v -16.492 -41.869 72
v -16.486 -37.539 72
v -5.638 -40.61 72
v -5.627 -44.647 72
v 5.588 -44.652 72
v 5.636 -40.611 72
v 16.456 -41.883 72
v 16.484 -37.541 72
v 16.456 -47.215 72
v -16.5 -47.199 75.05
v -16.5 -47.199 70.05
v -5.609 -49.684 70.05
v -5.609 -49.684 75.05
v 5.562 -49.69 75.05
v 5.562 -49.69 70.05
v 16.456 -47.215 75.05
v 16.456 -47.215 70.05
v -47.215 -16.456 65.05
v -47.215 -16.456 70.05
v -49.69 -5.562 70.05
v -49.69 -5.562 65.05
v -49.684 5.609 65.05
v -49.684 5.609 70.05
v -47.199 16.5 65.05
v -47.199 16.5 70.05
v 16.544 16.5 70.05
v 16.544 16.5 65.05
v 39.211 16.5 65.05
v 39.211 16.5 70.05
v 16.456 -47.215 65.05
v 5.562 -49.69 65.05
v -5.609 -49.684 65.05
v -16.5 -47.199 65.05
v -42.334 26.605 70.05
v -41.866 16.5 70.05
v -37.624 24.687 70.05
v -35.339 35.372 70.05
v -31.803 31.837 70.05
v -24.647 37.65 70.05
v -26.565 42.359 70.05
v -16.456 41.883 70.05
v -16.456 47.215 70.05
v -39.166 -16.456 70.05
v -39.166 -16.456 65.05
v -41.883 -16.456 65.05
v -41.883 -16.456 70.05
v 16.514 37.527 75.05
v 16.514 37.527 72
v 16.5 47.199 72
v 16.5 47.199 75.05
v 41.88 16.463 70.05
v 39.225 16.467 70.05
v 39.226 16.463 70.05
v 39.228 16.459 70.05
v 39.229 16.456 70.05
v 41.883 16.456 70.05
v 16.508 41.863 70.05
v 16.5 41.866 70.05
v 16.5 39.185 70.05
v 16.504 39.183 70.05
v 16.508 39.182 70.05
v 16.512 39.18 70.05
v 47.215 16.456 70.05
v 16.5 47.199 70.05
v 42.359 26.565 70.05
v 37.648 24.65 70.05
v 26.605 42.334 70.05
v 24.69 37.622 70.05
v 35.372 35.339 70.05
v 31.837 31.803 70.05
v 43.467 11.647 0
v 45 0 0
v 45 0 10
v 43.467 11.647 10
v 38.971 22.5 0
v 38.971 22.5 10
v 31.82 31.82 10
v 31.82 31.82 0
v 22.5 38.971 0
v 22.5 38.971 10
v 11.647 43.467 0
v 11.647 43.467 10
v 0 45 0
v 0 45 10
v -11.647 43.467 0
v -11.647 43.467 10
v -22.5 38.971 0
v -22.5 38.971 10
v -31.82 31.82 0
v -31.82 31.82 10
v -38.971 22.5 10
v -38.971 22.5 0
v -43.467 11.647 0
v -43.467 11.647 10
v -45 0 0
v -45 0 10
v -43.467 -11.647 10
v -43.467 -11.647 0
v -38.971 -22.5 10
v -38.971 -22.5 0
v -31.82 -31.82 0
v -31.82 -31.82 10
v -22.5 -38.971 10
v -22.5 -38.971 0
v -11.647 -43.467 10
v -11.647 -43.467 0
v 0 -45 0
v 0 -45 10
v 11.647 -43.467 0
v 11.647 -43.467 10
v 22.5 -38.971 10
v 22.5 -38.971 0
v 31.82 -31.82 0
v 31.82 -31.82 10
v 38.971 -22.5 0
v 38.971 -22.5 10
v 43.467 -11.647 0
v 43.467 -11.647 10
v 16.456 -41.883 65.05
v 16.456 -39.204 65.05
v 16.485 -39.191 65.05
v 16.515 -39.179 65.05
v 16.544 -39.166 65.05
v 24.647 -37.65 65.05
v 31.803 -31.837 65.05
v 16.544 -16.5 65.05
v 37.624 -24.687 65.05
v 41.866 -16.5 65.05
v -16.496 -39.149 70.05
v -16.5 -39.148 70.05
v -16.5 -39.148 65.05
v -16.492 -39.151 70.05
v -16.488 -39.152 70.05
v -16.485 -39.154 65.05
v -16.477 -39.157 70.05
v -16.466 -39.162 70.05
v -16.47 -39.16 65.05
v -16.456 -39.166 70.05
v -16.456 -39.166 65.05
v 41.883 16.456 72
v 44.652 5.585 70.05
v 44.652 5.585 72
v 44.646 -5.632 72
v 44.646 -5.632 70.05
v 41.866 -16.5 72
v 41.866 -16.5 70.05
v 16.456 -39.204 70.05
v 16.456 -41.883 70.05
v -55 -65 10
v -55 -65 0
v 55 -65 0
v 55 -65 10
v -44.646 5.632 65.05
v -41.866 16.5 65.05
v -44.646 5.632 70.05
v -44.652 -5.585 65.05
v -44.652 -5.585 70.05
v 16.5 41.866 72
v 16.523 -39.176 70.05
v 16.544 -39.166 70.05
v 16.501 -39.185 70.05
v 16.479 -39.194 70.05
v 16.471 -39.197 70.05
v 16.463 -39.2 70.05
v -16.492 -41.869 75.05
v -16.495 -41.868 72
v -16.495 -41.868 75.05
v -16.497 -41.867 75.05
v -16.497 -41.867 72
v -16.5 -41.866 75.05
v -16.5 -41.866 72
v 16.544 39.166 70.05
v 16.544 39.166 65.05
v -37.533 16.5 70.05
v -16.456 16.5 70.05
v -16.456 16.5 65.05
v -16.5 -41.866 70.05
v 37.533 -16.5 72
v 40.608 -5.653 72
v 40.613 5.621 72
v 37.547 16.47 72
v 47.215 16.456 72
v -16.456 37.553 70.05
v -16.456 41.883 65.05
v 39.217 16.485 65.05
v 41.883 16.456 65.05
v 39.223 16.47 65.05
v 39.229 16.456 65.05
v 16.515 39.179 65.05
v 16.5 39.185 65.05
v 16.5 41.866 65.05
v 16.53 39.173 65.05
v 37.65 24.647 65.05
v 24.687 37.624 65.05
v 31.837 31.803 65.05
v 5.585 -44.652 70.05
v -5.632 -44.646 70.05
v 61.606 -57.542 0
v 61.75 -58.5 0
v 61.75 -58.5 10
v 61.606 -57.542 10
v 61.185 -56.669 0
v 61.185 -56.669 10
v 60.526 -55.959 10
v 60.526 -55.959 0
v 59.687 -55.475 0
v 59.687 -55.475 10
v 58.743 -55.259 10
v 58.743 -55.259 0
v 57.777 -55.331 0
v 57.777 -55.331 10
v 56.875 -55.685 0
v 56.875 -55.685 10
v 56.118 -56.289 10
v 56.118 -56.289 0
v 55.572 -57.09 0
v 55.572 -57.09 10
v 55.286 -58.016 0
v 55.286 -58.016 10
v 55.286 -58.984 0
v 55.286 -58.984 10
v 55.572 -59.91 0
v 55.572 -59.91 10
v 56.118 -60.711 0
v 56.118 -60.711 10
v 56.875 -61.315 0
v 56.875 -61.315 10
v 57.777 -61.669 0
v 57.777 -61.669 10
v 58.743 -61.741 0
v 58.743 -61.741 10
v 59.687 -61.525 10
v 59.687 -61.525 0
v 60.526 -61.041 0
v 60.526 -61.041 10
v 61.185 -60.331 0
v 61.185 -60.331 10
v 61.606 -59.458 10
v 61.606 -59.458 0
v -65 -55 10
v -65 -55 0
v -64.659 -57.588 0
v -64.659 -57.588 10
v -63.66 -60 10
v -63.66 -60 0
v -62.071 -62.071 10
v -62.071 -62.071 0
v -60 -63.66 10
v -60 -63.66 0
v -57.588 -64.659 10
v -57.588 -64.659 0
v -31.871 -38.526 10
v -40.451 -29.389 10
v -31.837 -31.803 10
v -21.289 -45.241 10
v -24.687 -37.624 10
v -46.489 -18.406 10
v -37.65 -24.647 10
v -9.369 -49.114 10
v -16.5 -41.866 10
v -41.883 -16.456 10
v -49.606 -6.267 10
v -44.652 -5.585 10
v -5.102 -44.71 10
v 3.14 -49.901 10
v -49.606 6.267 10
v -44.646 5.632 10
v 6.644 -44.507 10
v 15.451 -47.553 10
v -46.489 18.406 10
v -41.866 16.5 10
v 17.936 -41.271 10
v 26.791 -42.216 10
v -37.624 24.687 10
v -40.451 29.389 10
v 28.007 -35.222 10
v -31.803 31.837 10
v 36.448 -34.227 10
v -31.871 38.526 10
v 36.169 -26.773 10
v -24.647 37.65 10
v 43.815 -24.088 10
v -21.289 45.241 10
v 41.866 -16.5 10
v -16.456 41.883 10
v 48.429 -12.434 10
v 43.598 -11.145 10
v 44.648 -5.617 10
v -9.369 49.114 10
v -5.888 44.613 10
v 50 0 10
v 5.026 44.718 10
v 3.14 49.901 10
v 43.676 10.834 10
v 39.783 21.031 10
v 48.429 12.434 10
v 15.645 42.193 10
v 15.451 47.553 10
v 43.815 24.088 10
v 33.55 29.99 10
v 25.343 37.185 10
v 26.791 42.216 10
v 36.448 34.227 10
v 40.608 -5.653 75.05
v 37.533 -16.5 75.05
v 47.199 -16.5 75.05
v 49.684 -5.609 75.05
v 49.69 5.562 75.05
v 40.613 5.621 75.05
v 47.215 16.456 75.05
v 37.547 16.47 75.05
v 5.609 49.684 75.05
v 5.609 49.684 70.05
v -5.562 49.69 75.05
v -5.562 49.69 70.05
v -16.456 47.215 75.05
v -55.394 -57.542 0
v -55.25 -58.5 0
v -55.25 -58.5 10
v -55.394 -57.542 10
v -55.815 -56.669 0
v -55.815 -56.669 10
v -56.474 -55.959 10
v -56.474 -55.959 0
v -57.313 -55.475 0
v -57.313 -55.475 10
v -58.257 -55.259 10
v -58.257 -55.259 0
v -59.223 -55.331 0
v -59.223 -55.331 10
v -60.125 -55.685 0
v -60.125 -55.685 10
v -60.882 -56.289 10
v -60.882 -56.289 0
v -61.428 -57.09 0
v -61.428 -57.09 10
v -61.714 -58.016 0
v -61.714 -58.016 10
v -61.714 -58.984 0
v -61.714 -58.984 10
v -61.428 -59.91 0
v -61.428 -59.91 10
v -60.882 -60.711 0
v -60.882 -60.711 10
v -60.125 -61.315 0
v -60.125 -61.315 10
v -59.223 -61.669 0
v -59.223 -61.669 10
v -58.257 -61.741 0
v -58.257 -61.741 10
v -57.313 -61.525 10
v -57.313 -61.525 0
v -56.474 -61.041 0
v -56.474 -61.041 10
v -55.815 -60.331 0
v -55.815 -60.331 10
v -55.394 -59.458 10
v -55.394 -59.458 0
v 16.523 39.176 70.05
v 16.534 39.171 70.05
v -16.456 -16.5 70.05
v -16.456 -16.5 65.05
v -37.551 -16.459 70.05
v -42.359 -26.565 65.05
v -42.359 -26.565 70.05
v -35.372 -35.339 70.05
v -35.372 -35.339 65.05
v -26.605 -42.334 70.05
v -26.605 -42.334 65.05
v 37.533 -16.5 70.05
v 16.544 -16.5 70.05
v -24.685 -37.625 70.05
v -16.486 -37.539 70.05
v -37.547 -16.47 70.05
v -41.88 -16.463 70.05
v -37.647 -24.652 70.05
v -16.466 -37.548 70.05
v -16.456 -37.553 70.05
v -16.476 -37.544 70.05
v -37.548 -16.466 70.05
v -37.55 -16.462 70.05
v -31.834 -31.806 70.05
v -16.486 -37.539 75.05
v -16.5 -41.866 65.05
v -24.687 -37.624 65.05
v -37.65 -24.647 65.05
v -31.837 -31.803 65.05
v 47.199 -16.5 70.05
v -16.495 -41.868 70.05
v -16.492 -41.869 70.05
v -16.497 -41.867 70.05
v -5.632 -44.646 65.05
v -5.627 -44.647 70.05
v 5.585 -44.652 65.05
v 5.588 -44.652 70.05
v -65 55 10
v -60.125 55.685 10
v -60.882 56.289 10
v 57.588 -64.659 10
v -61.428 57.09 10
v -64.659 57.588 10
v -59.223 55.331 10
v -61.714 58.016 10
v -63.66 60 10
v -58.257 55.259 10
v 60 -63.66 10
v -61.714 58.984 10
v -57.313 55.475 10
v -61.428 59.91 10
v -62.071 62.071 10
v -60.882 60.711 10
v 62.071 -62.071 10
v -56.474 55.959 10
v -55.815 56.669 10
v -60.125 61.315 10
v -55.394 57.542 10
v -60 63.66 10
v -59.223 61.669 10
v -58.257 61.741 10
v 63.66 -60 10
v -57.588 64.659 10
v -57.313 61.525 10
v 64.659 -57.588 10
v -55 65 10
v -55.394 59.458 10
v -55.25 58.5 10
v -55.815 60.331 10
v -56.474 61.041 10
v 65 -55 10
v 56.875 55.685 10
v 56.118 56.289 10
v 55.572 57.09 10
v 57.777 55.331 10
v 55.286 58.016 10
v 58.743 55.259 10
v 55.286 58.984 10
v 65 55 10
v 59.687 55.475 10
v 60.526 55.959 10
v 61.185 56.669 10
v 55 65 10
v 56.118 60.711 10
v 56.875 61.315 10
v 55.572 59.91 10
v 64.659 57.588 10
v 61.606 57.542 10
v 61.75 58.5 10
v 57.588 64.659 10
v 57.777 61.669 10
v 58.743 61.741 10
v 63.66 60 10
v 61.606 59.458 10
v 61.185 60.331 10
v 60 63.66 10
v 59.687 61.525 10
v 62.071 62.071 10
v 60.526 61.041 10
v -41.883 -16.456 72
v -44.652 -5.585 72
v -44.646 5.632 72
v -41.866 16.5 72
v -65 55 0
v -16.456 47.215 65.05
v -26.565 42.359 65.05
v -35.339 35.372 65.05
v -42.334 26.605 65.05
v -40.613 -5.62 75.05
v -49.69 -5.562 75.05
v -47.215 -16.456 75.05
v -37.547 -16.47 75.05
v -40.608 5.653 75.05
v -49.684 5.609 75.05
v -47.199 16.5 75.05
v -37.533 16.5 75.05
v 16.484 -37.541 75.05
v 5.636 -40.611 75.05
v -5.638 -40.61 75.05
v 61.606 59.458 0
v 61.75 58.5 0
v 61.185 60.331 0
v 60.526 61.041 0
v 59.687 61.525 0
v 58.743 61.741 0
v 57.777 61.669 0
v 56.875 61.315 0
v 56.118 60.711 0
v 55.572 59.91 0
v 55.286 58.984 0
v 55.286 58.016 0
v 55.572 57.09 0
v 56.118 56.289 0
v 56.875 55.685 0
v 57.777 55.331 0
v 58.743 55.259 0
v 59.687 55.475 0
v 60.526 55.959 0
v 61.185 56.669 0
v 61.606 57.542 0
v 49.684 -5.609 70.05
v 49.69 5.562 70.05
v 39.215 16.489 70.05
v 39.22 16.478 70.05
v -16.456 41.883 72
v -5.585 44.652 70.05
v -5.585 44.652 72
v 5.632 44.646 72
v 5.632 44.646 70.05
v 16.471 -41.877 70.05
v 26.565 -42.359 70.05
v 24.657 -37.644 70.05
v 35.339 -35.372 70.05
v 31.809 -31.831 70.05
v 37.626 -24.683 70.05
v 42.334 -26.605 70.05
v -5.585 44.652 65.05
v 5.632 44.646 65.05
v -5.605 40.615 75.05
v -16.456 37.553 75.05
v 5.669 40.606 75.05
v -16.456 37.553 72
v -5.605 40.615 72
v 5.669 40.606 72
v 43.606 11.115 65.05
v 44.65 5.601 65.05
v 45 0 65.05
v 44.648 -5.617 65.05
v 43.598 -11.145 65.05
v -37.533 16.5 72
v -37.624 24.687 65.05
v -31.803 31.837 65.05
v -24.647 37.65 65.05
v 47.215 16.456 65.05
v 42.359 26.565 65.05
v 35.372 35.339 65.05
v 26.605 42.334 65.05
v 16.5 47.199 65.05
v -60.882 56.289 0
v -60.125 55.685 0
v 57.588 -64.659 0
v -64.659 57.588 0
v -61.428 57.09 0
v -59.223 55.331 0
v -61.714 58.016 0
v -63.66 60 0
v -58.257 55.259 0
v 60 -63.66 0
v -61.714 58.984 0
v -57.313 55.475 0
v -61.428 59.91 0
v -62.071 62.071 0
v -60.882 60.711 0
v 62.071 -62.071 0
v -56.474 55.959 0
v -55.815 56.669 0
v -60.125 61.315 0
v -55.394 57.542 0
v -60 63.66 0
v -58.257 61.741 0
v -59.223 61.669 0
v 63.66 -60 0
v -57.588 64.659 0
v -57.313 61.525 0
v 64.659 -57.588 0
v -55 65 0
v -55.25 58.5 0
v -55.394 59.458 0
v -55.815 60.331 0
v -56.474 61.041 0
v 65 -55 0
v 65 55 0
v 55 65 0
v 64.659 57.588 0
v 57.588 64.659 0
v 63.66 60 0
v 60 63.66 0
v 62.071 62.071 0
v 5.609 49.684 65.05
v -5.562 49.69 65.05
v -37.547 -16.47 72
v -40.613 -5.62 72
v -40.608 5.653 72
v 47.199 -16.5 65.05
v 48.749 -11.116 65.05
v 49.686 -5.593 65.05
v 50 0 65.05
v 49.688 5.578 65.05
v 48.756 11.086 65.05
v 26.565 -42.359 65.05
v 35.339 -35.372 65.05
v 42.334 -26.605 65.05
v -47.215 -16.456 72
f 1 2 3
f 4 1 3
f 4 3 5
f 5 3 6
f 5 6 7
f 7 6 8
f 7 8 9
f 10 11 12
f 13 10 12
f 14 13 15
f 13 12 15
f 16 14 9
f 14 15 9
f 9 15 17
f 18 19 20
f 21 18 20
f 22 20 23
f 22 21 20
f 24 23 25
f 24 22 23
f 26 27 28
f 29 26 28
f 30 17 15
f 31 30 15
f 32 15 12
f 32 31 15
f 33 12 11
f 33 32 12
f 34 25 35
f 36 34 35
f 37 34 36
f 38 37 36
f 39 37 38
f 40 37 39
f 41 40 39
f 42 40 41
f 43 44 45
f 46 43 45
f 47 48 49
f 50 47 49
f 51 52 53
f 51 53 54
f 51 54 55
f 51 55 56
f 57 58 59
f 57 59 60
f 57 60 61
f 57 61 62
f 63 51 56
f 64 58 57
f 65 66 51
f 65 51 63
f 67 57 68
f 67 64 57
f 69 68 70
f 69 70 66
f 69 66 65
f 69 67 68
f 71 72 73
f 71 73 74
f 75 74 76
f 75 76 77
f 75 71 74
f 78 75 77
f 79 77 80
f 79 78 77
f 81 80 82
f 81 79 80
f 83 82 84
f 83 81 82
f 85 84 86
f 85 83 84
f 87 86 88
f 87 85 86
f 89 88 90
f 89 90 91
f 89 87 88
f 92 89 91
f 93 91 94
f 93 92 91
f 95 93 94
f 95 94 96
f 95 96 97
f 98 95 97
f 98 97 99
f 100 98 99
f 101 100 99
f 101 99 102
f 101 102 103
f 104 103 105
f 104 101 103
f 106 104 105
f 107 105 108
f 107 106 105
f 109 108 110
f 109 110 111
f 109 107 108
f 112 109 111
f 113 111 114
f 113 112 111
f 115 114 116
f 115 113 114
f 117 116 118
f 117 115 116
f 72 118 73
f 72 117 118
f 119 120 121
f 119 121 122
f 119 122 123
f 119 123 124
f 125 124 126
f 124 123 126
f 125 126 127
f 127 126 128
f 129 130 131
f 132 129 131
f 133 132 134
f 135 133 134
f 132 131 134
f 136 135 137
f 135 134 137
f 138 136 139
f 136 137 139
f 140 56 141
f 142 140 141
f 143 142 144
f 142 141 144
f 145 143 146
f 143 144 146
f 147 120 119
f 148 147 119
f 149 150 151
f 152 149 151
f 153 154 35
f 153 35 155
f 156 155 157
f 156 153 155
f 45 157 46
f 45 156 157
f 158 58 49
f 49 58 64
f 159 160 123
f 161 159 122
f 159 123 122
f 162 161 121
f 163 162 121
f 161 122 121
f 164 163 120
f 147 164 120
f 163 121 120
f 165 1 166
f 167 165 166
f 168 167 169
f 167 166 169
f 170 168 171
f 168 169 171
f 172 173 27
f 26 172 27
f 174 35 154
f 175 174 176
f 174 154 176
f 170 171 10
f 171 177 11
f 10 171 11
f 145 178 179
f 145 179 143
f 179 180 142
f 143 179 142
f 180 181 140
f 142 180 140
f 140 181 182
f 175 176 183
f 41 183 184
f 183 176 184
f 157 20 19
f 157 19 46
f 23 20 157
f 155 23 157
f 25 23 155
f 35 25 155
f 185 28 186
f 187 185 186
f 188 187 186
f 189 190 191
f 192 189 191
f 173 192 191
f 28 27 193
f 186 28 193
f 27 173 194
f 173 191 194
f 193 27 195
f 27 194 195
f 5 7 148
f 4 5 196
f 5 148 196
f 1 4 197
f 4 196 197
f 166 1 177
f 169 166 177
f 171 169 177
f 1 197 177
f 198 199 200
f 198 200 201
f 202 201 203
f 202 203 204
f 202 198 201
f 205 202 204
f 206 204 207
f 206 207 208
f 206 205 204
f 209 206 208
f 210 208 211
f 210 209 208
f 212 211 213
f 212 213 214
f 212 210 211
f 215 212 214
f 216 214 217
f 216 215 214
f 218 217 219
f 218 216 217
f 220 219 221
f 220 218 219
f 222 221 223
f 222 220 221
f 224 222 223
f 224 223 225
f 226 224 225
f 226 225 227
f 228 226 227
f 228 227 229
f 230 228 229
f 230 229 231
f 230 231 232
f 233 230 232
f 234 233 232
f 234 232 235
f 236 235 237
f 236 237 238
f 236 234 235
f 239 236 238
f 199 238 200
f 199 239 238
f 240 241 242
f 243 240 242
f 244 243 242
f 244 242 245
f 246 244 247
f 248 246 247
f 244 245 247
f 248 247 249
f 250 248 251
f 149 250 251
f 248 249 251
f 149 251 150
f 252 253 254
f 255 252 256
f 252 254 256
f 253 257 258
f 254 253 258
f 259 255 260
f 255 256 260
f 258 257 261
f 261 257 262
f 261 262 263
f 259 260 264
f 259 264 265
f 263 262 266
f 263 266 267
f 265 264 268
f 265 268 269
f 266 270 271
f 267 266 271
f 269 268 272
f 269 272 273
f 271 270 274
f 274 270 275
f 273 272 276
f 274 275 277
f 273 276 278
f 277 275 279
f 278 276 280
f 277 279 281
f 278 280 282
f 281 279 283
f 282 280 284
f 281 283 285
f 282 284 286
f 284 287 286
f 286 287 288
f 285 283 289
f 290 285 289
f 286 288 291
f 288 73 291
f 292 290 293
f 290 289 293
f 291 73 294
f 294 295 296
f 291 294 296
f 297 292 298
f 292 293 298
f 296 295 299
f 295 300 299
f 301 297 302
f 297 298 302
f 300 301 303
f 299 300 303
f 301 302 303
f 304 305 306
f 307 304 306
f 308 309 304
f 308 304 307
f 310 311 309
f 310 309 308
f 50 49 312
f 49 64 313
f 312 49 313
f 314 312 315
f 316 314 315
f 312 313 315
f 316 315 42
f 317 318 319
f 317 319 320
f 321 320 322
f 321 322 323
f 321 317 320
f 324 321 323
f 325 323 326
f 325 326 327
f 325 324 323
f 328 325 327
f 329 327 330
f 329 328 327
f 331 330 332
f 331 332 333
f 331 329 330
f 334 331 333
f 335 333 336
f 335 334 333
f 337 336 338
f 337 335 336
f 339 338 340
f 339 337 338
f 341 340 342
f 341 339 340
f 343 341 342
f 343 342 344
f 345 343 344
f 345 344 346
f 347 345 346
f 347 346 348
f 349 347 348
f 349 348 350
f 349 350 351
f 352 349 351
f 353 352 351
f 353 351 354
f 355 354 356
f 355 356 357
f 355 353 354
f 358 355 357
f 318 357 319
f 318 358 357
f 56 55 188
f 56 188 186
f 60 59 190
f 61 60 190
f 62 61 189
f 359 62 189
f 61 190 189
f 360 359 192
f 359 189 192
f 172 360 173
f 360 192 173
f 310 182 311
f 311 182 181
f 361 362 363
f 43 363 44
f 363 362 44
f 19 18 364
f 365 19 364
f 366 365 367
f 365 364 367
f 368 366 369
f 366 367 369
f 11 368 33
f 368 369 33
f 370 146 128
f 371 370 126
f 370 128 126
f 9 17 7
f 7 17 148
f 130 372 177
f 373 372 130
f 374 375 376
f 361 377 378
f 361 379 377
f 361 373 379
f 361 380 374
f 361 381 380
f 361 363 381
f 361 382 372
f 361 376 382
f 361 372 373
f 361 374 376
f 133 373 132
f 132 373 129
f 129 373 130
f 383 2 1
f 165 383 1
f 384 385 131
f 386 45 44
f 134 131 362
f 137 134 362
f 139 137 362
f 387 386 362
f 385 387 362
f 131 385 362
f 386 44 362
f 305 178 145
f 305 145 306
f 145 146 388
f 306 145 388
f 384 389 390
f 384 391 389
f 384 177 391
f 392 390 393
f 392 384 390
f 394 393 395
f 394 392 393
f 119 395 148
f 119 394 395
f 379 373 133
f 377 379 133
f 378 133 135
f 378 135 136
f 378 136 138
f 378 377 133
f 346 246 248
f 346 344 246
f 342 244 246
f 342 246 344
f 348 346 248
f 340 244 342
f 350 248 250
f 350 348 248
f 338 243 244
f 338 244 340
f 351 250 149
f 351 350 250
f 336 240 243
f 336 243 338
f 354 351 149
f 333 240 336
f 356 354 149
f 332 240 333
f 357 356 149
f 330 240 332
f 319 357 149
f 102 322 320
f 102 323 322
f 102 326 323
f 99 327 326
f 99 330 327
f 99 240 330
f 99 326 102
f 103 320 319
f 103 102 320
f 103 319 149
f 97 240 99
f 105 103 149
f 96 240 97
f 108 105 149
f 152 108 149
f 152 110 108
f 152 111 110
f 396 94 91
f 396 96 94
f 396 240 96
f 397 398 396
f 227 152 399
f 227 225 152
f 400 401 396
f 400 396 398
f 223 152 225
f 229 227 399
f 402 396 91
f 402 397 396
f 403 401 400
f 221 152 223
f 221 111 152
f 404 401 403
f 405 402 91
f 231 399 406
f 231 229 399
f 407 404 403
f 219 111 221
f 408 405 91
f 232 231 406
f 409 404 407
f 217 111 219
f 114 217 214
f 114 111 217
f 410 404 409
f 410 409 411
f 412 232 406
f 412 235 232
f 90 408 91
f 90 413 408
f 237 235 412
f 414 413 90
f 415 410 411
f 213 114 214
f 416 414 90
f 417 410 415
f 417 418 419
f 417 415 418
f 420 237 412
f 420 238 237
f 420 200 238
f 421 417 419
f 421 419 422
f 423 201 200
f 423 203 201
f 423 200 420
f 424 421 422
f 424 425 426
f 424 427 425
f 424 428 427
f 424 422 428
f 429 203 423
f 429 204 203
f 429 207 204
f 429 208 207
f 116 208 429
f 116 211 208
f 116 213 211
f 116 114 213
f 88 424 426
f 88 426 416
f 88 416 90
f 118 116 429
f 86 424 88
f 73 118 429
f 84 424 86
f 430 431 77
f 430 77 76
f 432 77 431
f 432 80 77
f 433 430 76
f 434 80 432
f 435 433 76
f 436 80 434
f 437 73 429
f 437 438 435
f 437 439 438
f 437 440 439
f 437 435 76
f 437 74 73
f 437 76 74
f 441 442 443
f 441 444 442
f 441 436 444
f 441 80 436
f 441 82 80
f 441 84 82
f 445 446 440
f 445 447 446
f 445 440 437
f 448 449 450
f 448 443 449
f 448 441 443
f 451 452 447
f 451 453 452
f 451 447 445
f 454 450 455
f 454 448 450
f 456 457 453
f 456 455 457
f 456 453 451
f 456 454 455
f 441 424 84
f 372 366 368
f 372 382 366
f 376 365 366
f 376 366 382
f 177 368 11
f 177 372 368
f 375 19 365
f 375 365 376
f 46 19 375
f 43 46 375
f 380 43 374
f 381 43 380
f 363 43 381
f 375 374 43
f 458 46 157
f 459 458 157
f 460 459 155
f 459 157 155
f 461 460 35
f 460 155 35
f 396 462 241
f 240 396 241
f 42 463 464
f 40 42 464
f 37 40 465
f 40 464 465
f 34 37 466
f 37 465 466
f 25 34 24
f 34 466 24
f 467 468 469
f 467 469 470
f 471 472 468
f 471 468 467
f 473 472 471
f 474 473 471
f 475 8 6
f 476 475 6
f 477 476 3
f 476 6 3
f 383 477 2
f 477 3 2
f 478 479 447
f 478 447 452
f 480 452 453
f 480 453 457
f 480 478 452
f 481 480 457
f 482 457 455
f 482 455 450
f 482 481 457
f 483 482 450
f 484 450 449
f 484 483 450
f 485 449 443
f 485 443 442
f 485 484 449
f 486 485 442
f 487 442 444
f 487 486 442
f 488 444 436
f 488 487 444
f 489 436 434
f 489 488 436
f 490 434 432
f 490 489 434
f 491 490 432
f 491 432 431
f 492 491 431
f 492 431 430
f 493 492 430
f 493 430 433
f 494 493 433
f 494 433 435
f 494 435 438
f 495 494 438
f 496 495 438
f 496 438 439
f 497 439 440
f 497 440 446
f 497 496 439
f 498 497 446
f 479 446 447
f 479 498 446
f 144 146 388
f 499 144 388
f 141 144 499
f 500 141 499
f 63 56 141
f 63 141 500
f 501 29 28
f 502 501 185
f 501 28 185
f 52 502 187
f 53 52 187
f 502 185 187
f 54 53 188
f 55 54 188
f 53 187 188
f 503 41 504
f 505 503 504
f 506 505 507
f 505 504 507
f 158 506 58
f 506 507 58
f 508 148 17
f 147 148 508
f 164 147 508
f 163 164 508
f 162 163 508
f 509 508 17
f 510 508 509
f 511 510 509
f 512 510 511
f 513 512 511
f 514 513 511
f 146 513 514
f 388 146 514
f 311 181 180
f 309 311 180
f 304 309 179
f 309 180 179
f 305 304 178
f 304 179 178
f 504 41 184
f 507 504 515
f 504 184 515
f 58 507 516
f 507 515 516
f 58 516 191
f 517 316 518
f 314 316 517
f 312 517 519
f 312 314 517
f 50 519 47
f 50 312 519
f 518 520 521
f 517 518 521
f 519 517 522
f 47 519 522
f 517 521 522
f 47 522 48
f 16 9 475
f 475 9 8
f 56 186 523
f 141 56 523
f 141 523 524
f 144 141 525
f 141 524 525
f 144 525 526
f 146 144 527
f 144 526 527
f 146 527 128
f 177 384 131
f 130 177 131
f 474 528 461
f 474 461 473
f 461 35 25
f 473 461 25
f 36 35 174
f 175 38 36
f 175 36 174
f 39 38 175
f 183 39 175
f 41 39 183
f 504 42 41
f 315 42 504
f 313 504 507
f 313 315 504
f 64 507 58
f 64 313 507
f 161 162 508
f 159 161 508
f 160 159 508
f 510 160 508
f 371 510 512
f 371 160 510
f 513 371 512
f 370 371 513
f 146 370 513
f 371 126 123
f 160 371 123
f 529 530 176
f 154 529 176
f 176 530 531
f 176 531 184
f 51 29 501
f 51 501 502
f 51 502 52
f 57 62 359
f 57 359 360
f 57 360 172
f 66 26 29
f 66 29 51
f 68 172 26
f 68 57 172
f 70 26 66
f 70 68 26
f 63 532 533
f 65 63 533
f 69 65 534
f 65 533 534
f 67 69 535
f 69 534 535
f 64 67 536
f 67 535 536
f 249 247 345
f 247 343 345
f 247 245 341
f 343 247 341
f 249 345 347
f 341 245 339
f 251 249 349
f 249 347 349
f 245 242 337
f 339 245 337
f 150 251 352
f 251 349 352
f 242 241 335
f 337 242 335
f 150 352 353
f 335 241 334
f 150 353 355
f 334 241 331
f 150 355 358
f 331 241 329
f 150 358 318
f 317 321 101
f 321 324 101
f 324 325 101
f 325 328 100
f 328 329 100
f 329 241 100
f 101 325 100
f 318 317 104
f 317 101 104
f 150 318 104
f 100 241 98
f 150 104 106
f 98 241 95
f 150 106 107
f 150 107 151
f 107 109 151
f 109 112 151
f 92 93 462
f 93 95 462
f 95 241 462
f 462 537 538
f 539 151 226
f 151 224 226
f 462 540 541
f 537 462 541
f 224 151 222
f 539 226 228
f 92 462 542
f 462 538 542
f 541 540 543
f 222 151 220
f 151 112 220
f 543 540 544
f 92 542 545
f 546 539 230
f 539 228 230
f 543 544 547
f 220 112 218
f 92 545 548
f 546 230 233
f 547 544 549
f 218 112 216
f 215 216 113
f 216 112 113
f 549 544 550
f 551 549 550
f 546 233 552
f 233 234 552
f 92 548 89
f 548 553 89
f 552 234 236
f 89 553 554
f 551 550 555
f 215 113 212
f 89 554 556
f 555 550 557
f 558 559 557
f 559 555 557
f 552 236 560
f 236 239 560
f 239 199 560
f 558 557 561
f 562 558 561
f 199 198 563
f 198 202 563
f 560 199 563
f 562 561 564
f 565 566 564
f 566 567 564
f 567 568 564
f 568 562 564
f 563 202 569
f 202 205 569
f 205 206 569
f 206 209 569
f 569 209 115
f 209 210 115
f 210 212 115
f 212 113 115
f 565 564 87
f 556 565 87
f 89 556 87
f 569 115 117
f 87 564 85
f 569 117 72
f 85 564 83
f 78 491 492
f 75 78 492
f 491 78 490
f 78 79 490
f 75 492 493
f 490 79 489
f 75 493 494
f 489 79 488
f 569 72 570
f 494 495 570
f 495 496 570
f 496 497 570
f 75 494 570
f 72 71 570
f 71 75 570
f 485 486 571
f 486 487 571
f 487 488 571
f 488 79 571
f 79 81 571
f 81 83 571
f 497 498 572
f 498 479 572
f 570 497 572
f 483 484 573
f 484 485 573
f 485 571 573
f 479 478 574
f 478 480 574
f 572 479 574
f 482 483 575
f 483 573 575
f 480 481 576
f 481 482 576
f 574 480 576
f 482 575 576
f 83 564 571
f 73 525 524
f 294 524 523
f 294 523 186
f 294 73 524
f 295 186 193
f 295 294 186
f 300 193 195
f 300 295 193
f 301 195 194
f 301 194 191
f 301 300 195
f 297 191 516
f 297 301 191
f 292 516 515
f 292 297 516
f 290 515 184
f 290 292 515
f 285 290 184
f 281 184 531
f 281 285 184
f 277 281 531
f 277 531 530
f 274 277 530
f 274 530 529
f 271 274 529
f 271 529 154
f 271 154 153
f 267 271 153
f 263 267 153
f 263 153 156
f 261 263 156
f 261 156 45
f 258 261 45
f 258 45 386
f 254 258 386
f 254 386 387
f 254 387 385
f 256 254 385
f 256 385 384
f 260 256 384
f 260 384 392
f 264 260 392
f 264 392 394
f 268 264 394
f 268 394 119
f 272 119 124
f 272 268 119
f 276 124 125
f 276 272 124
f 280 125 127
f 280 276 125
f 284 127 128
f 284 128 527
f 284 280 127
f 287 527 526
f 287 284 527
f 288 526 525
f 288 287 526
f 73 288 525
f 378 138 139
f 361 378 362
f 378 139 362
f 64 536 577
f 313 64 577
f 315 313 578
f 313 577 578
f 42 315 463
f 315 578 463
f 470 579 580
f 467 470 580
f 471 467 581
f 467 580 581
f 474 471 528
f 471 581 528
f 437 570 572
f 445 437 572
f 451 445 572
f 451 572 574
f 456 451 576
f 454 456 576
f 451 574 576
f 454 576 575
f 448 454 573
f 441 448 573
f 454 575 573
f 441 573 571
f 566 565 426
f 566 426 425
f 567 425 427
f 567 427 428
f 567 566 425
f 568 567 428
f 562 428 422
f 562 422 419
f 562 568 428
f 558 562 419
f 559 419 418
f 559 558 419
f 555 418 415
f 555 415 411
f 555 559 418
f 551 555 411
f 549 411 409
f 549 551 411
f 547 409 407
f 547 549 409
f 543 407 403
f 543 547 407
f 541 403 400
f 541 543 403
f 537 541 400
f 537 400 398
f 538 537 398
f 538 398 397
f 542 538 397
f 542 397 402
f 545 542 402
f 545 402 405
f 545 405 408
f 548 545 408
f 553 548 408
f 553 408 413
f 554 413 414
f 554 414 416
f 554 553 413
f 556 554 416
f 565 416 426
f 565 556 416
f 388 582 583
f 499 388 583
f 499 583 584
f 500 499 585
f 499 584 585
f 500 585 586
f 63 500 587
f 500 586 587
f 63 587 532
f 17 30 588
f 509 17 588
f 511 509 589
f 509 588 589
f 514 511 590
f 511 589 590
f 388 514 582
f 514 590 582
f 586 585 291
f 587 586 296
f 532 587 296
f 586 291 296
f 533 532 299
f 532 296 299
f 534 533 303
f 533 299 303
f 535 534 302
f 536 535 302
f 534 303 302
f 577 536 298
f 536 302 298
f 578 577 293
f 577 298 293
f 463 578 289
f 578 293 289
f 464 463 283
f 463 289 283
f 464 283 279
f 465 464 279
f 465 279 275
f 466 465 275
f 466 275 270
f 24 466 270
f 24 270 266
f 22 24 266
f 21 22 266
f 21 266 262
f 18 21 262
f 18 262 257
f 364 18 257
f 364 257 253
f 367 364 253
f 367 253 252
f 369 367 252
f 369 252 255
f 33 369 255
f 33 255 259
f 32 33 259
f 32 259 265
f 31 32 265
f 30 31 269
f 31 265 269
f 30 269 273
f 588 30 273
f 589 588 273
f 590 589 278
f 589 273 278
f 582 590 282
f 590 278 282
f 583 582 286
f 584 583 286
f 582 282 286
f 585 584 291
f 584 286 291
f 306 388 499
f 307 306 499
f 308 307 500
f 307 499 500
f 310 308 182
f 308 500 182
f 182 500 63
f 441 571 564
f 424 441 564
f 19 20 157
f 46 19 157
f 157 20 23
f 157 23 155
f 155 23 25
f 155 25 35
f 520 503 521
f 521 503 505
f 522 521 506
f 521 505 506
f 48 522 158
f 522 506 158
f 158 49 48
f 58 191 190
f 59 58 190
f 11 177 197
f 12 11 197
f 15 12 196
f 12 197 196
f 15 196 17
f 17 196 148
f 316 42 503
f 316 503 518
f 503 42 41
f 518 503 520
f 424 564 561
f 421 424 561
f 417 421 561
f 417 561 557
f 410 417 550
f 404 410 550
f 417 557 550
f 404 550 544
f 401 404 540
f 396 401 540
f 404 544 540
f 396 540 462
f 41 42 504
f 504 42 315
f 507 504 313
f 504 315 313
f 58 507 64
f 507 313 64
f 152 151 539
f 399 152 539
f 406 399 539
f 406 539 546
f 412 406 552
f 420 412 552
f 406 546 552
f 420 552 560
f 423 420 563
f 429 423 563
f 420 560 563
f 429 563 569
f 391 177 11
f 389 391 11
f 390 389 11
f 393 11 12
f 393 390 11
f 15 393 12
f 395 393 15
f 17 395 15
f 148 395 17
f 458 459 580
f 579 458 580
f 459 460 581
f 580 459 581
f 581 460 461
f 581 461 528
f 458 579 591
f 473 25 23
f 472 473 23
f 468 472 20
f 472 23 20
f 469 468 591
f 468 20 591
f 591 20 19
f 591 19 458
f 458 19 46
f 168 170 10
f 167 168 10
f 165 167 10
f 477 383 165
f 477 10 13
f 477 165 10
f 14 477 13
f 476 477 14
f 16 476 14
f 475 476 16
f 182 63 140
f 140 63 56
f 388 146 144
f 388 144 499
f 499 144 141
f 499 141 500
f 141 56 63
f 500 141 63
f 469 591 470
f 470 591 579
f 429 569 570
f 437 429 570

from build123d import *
from build123d.topology import SkipClean

# Parameters (mm, degrees)
DODANIE_WYCI_GNI_CIE2_DEPTH = 10
SZKIC2_R                    = 50
SZKIC2_R_2                  = 45
DODANIE_WYCI_GNI_CIE3_DEPTH = 55.05
SZKIC4_R                    = 3.25
WYTNIJ_WYCI_GNI_CIE2_DEPTH  = 55
DODANIE_WYCI_GNI_CIE4_DEPTH = 5
SZKIC8_R                    = 45
WYTNIJ_WYCI_GNI_CIE3_DEPTH  = 110.799829235
DODANIE_WYCI_GNI_CIE5_DEPTH = 10
DODANIE_WYCI_GNI_CIE6_START = -3.05
DODANIE_WYCI_GNI_CIE6_DEPTH = 3.05
PODZIEL1_OUTLINE_R          = 3.25
PODZIEL1_OUTLINE_R_2        = 45
PODZIEL1_DEPTH              = 10
PODZIEL1_2_OUTLINE_R        = 3.25
PODZIEL1_2_DEPTH            = 10
PODZIEL1_START              = 70.05
PODZIEL1_3_OUTLINE_R        = 3.25
PODZIEL1_3_DEPTH            = 5
PODZIEL1_START_2            = 72
PODZIEL1_4_DEPTH            = 3.05
PODZIEL1_5_DEPTH            = 1.95
PODZIEL1_6_DEPTH            = 3.05
PODZIEL1_7_DEPTH            = 1.95
PODZIEL1_8_DEPTH            = 3.05
PODZIEL1_9_DEPTH            = 1.95
PODZIEL1_10_DEPTH           = 3.05
PODZIEL1_11_DEPTH           = 1.95


# Read off the part's stored shape, not the designer's step: Podziel1
with BuildPart() as part:
    # Szkic1 → Dodanie-wyciągnięcie2 (new body)
    with BuildSketch(Plane.XY):
        with BuildLine():
            Line((-55, 65), (55, 65))
            ThreePointArc((55, 65), (62.071067812, 62.071067812), (65, 55))
            Line((65, 55), (65, -55))
            ThreePointArc((65, -55), (62.071067812, -62.071067812), (55, -65))
            Line((55, -65), (-55, -65))
            ThreePointArc((-55, -65), (-62.071067812, -62.071067812), (-65, -55))
            Line((-65, -55), (-65, 55))
            ThreePointArc((-65, 55), (-62.071067812, 62.071067812), (-55, 65))
        make_face()
    extrude(amount=DODANIE_WYCI_GNI_CIE2_DEPTH)

    # Szkic2 → Dodanie-wyciągnięcie3 (add)
    with BuildSketch(Plane.XY.offset(10)):
        Circle(SZKIC2_R)
        Circle(SZKIC2_R_2, mode=Mode.SUBTRACT)
    extrude(amount=DODANIE_WYCI_GNI_CIE3_DEPTH)

    # Szkic4 → Wytnij-wyciągnięcie2 (cut)
    with BuildSketch(Plane.XY.offset(10)):
        with Locations((-58.5, 58.5)):
            Circle(SZKIC4_R)
        with Locations((58.5, 58.5)):
            Circle(SZKIC4_R)
        with Locations((58.5, -58.5)):
            Circle(SZKIC4_R)
        with Locations((-58.5, -58.5)):
            Circle(SZKIC4_R)
    extrude(amount=-WYTNIJ_WYCI_GNI_CIE2_DEPTH, mode=Mode.SUBTRACT)

    # Szkic7 → Dodanie-wyciągnięcie4 (add)
    with BuildSketch(Plane.XY.offset(65.05)):
        with BuildLine():
            Line((-16.455530898, 16.5), (-16.455530898, 47.214568757))
            ThreePointArc((-16.455530898, 47.214568757), (-35.338682666, 35.371987609), (-47.199046601, 16.5))
            Line((-47.199046601, 16.5), (-16.455530898, 16.5))
        make_face()
        with BuildLine():
            ThreePointArc((16.5, 39.185016306), (16.522237205, 39.17567049), (16.544469102, 39.166312055))
            Line((16.544469102, 39.166312055), (16.544469102, 16.5))
            Line((16.544469102, 16.5), (39.210781157, 16.5))
            ThreePointArc((39.210781157, 16.5), (39.220139592, 16.477768103), (39.229485408, 16.455530898))
            Line((39.229485408, 16.455530898), (47.214568757, 16.455530898))
            ThreePointArc((47.214568757, 16.455530898), (35.371987609, 35.338682666), (16.5, 47.199046601))
            Line((16.5, 47.199046601), (16.5, 39.185016306))
        make_face()
        with BuildLine():
            ThreePointArc((-16.5, -39.147548354), (-16.477768113, -39.156936517), (-16.455530898, -39.166312055))
            Line((-16.455530898, -39.166312055), (-16.455530898, -16.5))
            Line((-16.455530898, -16.5), (-39.166312055, -16.455530898))
            Line((-39.166312055, -16.455530898), (-47.214568757, -16.455530898))
            ThreePointArc((-47.214568757, -16.455530898), (-35.371987609, -35.338682666), (-16.5, -47.199046601))
            Line((-16.5, -47.199046601), (-16.5, -39.147548354))
        make_face()
        with BuildLine():
            Line((16.544469102, -16.5), (16.544469102, -39.166312055))
            ThreePointArc((16.544469102, -39.166312055), (16.500010596, -39.185011856), (16.455530898, -39.20366119))
            Line((16.455530898, -39.20366119), (16.455530898, -47.214568757))
            ThreePointArc((16.455530898, -47.214568757), (35.338682666, -35.371987609), (47.199046601, -16.5))
            Line((47.199046601, -16.5), (16.544469102, -16.5))
        make_face()
    extrude(amount=DODANIE_WYCI_GNI_CIE4_DEPTH)

    # Szkic8 → Wytnij-wyciągnięcie3 (cut, through all)
    with SkipClean():  # the faces are left unmerged after this step: merging them gives an invalid solid
        with BuildSketch(Plane.XY.offset(10)):
            with Locations(Location((0, 0, 0), (0, 0, 201.449342522))):
                Circle(SZKIC8_R)
        extrude(amount=-WYTNIJ_WYCI_GNI_CIE3_DEPTH, mode=Mode.SUBTRACT)
    add(part.part.scale(1), mode=Mode.REPLACE)  # the faces are merged on a copy

    # Szkic9 → Dodanie-wyciągnięcie5 (add)
    with SkipClean():  # the faces are left unmerged after this step: merging them gives an invalid solid
        with BuildSketch(Plane.XY.offset(65.05)):
            with BuildLine():
                Line((-41.883355917, -16.455530898), (-47.214568757, -16.455530898))
                ThreePointArc((-47.214568757, -16.455530898), (-49.999994454, 0.023550151), (-47.199046601, 16.5))
                Line((-47.199046601, 16.5), (-41.865857211, 16.5))
                ThreePointArc((-41.865857211, 16.5), (-44.999993656, 0.023894067), (-41.883355917, -16.455530898))
            make_face()
            with BuildLine():
                Line((16.455530898, -41.883355917), (16.455530898, -47.214568757))
                ThreePointArc((16.455530898, -47.214568757), (-0.023550151, -49.999994454), (-16.5, -47.199046601))
                Line((-16.5, -47.199046601), (-16.5, -41.865857211))
                ThreePointArc((-16.5, -41.865857211), (-0.023894067, -44.999993656), (16.455530898, -41.883355917))
            make_face()
            with BuildLine():
                Line((41.865857211, -16.5), (47.199046601, -16.5))
                ThreePointArc((47.199046601, -16.5), (49.999994454, -0.023550151), (47.214568757, 16.455530898))
                Line((47.214568757, 16.455530898), (41.883355917, 16.455530898))
                ThreePointArc((41.883355917, 16.455530898), (44.999993656, -0.023894067), (41.865857211, -16.5))
            make_face()
            with BuildLine():
                Line((16.5, 41.865857211), (16.5, 47.199046601))
                ThreePointArc((16.5, 47.199046601), (0.023550151, 49.999994454), (-16.455530898, 47.214568757))
                Line((-16.455530898, 47.214568757), (-16.455530898, 41.883355917))
                ThreePointArc((-16.455530898, 41.883355917), (0.023894067, 44.999993656), (16.5, 41.865857211))
            make_face()
        extrude(amount=DODANIE_WYCI_GNI_CIE5_DEPTH)

    # Szkic10 → Dodanie-wyciągnięcie6 (add)
    with SkipClean():  # the faces are left unmerged after this step: merging them gives an invalid solid
        with BuildSketch(Plane.XY.offset(75.05).offset(DODANIE_WYCI_GNI_CIE6_START)):
            with BuildLine():
                Line((-37.546708344, -16.469507963), (-47.214568757, -16.455530898))
                ThreePointArc((-47.214568757, -16.455530898), (-49.999994454, 0.023550151), (-47.199046601, 16.5))
                Line((-47.199046601, 16.5), (-37.533318532, 16.5))
                ThreePointArc((-37.533318532, 16.5), (-40.999996619, 0.016651212), (-37.546708344, -16.469507963))
            make_face()
            with BuildLine():
                Line((-16.5, -47.199046601), (-16.486007616, -37.539466604))
                ThreePointArc((-16.486007616, -37.539466604), (-0.001345704, -40.999999978), (16.483543336, -37.540548732))
                Line((16.483543336, -37.540548732), (16.455530898, -47.214568757))
                ThreePointArc((16.455530898, -47.214568757), (-0.023550151, -49.999994454), (-16.5, -47.199046601))
            make_face()
            with BuildLine():
                Line((47.199046601, -16.5), (37.533318532, -16.5))
                ThreePointArc((37.533318532, -16.5), (40.999996628, -0.016629068), (37.546690554, 16.46954852))
                Line((37.546690554, 16.46954852), (47.214568757, 16.455530898))
                ThreePointArc((47.214568757, 16.455530898), (49.999994454, -0.023550151), (47.199046601, -16.5))
            make_face()
            with BuildLine():
                Line((-16.455530898, 47.214568757), (-16.455530898, 37.552836149))
                ThreePointArc((-16.455530898, 37.552836149), (0.031934624, 40.999987563), (16.514010216, 37.527156388))
                Line((16.514010216, 37.527156388), (16.5, 47.199046601))
                ThreePointArc((16.5, 47.199046601), (0.023550151, 49.999994454), (-16.455530898, 47.214568757))
            make_face()
        extrude(amount=DODANIE_WYCI_GNI_CIE6_DEPTH)

    # Podziel1 2 outline → Podziel1 2 (cut)
    with SkipClean():  # the faces are left unmerged after this step: merging them gives an invalid solid
        with BuildSketch(Plane.XY):
            with BuildLine():
                ThreePointArc((-65, -55), (-62.071067812, -62.071067812), (-55, -65))
                Line((-55, -65), (55, -65))
                ThreePointArc((55, -65), (62.071067812, -62.071067812), (65, -55))
                Line((65, -55), (65, 55))
                ThreePointArc((65, 55), (62.071067812, 62.071067812), (55, 65))
                Line((55, 65), (-55, 65))
                ThreePointArc((-55, 65), (-62.071067812, 62.071067812), (-65, 55))
                Line((-65, 55), (-65, -55))
            make_face()
            with BuildLine():
                ThreePointArc((41.865857211, -16.5), (17.936369644, -41.270893424), (-16.5, -41.865857211))
                ThreePointArc((-16.5, -41.865857211), (-41.270893424, -17.936369644), (-41.865857211, 16.5))
                ThreePointArc((-41.865857211, 16.5), (-31.802905011, 31.836696325), (-16.455530898, 41.883355917))
                ThreePointArc((-16.455530898, 41.883355917), (31.836696325, 31.802905011), (41.865857211, -16.5))
            make_face(mode=Mode.SUBTRACT)
            with Locations((-58.5, -58.5)):
                Circle(PODZIEL1_2_OUTLINE_R, mode=Mode.SUBTRACT)
            with Locations((58.5, -58.5)):
                Circle(PODZIEL1_2_OUTLINE_R, mode=Mode.SUBTRACT)
            with Locations((-58.5, 58.5)):
                Circle(PODZIEL1_2_OUTLINE_R, mode=Mode.SUBTRACT)
            with Locations((58.5, 58.5)):
                Circle(PODZIEL1_2_OUTLINE_R, mode=Mode.SUBTRACT)
        extrude(amount=PODZIEL1_2_DEPTH, mode=Mode.SUBTRACT)

    # Podziel1 3 outline → Podziel1 3 (cut)
    with SkipClean():  # the faces are left unmerged after this step: merging them gives an invalid solid
        with BuildSketch(Plane.XY.offset(PODZIEL1_START)):
            with BuildLine():
                ThreePointArc((-65, -55), (-62.071067812, -62.071067812), (-55, -65))
                Line((-55, -65), (55, -65))
                ThreePointArc((55, -65), (62.071067812, -62.071067812), (65, -55))
                Line((65, -55), (65, 55))
                ThreePointArc((65, 55), (62.071067812, 62.071067812), (55, 65))
                Line((55, 65), (-55, 65))
                ThreePointArc((-55, 65), (-62.071067812, 62.071067812), (-65, 55))
                Line((-65, 55), (-65, -55))
            make_face()
            with BuildLine():
                Line((37.533318532, -16.5), (41.865857211, -16.5))
                ThreePointArc((41.865857211, -16.5), (31.808778722, -31.830827765), (16.47098574, -41.87728058))
                Line((16.47098574, -41.87728058), (16.483543336, -37.540548732))
                ThreePointArc((16.483543336, -37.540548732), (-0.001345704, -40.999999978), (-16.486007616, -37.539466604))
                Line((-16.486007616, -37.539466604), (-16.492279016, -41.868899351))
                ThreePointArc((-16.492279016, -41.868899351), (-16.496139578, -41.867378459), (-16.5, -41.865857211))
                ThreePointArc((-16.5, -41.865857211), (-31.8337682, -31.805835977), (-41.880325193, -16.463242746))
                Line((-41.880325193, -16.463242746), (-37.546708344, -16.469507963))
                ThreePointArc((-37.546708344, -16.469507963), (-40.999996619, 0.016651212), (-37.533318532, 16.5))
                Line((-37.533318532, 16.5), (-41.865857211, 16.5))
                ThreePointArc((-41.865857211, 16.5), (-31.802905011, 31.836696325), (-16.455530898, 41.883355917))
                Line((-16.455530898, 41.883355917), (-16.455530898, 37.552836149))
                ThreePointArc((-16.455530898, 37.552836149), (0.031934624, 40.999987563), (16.514010216, 37.527156388))
                Line((16.514010216, 37.527156388), (16.507729805, 41.862809947))
                ThreePointArc((16.507729805, 41.862809947), (31.836695874, 31.802905462), (41.880316397, 16.463265122))
                Line((41.880316397, 16.463265122), (37.546690554, 16.46954852))
                ThreePointArc((37.546690554, 16.46954852), (40.999996628, -0.016629068), (37.533318532, -16.5))
            make_face(mode=Mode.SUBTRACT)
            with Locations((-58.5, -58.5)):
                Circle(PODZIEL1_3_OUTLINE_R, mode=Mode.SUBTRACT)
            with Locations((58.5, -58.5)):
                Circle(PODZIEL1_3_OUTLINE_R, mode=Mode.SUBTRACT)
            with Locations((-58.5, 58.5)):
                Circle(PODZIEL1_3_OUTLINE_R, mode=Mode.SUBTRACT)
            with Locations((58.5, 58.5)):
                Circle(PODZIEL1_3_OUTLINE_R, mode=Mode.SUBTRACT)
        extrude(amount=PODZIEL1_3_DEPTH, mode=Mode.SUBTRACT)


with BuildPart() as body_2:
    # Podziel1 outline → Podziel1 (new body)
    with BuildSketch(Plane.XY):
        with BuildLine():
            Line((-55, -65), (55, -65))
            ThreePointArc((55, -65), (62.071067812, -62.071067812), (65, -55))
            Line((65, -55), (65, 55))
            ThreePointArc((65, 55), (62.071067812, 62.071067812), (55, 65))
            Line((55, 65), (-55, 65))
            ThreePointArc((-55, 65), (-62.071067812, 62.071067812), (-65, 55))
            Line((-65, 55), (-65, -55))
            ThreePointArc((-65, -55), (-62.071067812, -62.071067812), (-55, -65))
        make_face()
        with Locations((-58.5, -58.5)):
            Circle(PODZIEL1_OUTLINE_R, mode=Mode.SUBTRACT)
        with Locations((58.5, -58.5)):
            Circle(PODZIEL1_OUTLINE_R, mode=Mode.SUBTRACT)
        with Locations((-58.5, 58.5)):
            Circle(PODZIEL1_OUTLINE_R, mode=Mode.SUBTRACT)
        Circle(PODZIEL1_OUTLINE_R_2, mode=Mode.SUBTRACT)
        with Locations((58.5, 58.5)):
            Circle(PODZIEL1_OUTLINE_R, mode=Mode.SUBTRACT)
    extrude(amount=PODZIEL1_DEPTH)


with BuildPart() as body_3:
    # Podziel1 4 outline → Podziel1 4 (new body)
    with BuildSketch(Plane.XY.offset(PODZIEL1_START_2)):
        with BuildLine():
            Line((37.533318532, -16.5), (47.199046601, -16.5))
            ThreePointArc((47.199046601, -16.5), (49.999994454, -0.023550151), (47.214568757, 16.455530898))
            Line((47.214568757, 16.455530898), (37.546690554, 16.46954852))
            ThreePointArc((37.546690554, 16.46954852), (40.999996628, -0.016629068), (37.533318532, -16.5))
        make_face()
    extrude(amount=PODZIEL1_4_DEPTH)

    # Podziel1 5 outline → Podziel1 5 (add)
    with BuildSketch(Plane.XY.offset(PODZIEL1_START)):
        with BuildLine():
            ThreePointArc((47.199046601, -16.5), (49.999994454, -0.023550151), (47.214568757, 16.455530898))
            Line((47.214568757, 16.455530898), (41.883355917, 16.455530898))
            ThreePointArc((41.883355917, 16.455530898), (44.999993656, -0.023894067), (41.865857211, -16.5))
            Line((41.865857211, -16.5), (47.199046601, -16.5))
        make_face()
    extrude(amount=PODZIEL1_5_DEPTH)


with BuildPart() as body_4:
    # Podziel1 6 outline → Podziel1 6 (new body)
    with BuildSketch(Plane.XY.offset(PODZIEL1_START_2)):
        with BuildLine():
            ThreePointArc((16.483543336, -37.540548732), (-0.001345704, -40.999999978), (-16.486007616, -37.539466604))
            Line((-16.486007616, -37.539466604), (-16.492279016, -41.868899351))
            ThreePointArc((-16.492279016, -41.868899351), (-16.496139578, -41.867378459), (-16.5, -41.865857211))
            Line((-16.5, -41.865857211), (-16.5, -47.199046601))
            ThreePointArc((-16.5, -47.199046601), (-0.023550151, -49.999994454), (16.455530898, -47.214568757))
            Line((16.455530898, -47.214568757), (16.483543336, -37.540548732))
        make_face()
    extrude(amount=PODZIEL1_6_DEPTH)

    # Podziel1 7 outline → Podziel1 7 (add)
    with BuildSketch(Plane.XY.offset(PODZIEL1_START)):
        with BuildLine():
            ThreePointArc((16.455530898, -41.883355917), (-0.023894067, -44.999993656), (-16.5, -41.865857211))
            Line((-16.5, -41.865857211), (-16.5, -47.199046601))
            ThreePointArc((-16.5, -47.199046601), (-0.023550151, -49.999994454), (16.455530898, -47.214568757))
            Line((16.455530898, -47.214568757), (16.455530898, -41.883355917))
        make_face()
    extrude(amount=PODZIEL1_7_DEPTH)


with BuildPart() as body_5:
    # Podziel1 8 outline → Podziel1 8 (new body)
    with BuildSketch(Plane.XY.offset(PODZIEL1_START_2)):
        with BuildLine():
            Line((-37.533318532, 16.5), (-47.199046601, 16.5))
            ThreePointArc((-47.199046601, 16.5), (-49.999994454, 0.023550151), (-47.214568757, -16.455530898))
            Line((-47.214568757, -16.455530898), (-37.546708344, -16.469507963))
            ThreePointArc((-37.546708344, -16.469507963), (-40.999996619, 0.016651212), (-37.533318532, 16.5))
        make_face()
    extrude(amount=PODZIEL1_8_DEPTH)

    # Podziel1 9 outline → Podziel1 9 (add)
    with BuildSketch(Plane.XY.offset(PODZIEL1_START)):
        with BuildLine():
            ThreePointArc((-47.199046601, 16.5), (-49.999994454, 0.023550151), (-47.214568757, -16.455530898))
            Line((-47.214568757, -16.455530898), (-41.883355917, -16.455530898))
            ThreePointArc((-41.883355917, -16.455530898), (-44.999993656, 0.023894067), (-41.865857211, 16.5))
            Line((-41.865857211, 16.5), (-47.199046601, 16.5))
        make_face()
    extrude(amount=PODZIEL1_9_DEPTH)


with BuildPart() as body_6:
    # Podziel1 10 outline → Podziel1 10 (new body)
    with BuildSketch(Plane.XY.offset(PODZIEL1_START_2)):
        with BuildLine():
            ThreePointArc((-16.455530898, 37.552836149), (0.031934624, 40.999987563), (16.514010216, 37.527156388))
            Line((16.514010216, 37.527156388), (16.5, 47.199046601))
            ThreePointArc((16.5, 47.199046601), (0.023550151, 49.999994454), (-16.455530898, 47.214568757))
            Line((-16.455530898, 47.214568757), (-16.455530898, 37.552836149))
        make_face()
    extrude(amount=PODZIEL1_10_DEPTH)

    # Podziel1 11 outline → Podziel1 11 (add)
    with BuildSketch(Plane.XY.offset(PODZIEL1_START)):
        with BuildLine():
            Line((16.5, 41.865857211), (16.5, 47.199046601))
            ThreePointArc((16.5, 47.199046601), (0.023550151, 49.999994454), (-16.455530898, 47.214568757))
            Line((-16.455530898, 47.214568757), (-16.455530898, 41.883355917))
            ThreePointArc((-16.455530898, 41.883355917), (0.023894067, 44.999993656), (16.5, 41.865857211))
        make_face()
    extrude(amount=PODZIEL1_11_DEPTH)


solid = Compound([part.part, body_2.part, body_3.part, body_4.part, body_5.part, body_6.part])
